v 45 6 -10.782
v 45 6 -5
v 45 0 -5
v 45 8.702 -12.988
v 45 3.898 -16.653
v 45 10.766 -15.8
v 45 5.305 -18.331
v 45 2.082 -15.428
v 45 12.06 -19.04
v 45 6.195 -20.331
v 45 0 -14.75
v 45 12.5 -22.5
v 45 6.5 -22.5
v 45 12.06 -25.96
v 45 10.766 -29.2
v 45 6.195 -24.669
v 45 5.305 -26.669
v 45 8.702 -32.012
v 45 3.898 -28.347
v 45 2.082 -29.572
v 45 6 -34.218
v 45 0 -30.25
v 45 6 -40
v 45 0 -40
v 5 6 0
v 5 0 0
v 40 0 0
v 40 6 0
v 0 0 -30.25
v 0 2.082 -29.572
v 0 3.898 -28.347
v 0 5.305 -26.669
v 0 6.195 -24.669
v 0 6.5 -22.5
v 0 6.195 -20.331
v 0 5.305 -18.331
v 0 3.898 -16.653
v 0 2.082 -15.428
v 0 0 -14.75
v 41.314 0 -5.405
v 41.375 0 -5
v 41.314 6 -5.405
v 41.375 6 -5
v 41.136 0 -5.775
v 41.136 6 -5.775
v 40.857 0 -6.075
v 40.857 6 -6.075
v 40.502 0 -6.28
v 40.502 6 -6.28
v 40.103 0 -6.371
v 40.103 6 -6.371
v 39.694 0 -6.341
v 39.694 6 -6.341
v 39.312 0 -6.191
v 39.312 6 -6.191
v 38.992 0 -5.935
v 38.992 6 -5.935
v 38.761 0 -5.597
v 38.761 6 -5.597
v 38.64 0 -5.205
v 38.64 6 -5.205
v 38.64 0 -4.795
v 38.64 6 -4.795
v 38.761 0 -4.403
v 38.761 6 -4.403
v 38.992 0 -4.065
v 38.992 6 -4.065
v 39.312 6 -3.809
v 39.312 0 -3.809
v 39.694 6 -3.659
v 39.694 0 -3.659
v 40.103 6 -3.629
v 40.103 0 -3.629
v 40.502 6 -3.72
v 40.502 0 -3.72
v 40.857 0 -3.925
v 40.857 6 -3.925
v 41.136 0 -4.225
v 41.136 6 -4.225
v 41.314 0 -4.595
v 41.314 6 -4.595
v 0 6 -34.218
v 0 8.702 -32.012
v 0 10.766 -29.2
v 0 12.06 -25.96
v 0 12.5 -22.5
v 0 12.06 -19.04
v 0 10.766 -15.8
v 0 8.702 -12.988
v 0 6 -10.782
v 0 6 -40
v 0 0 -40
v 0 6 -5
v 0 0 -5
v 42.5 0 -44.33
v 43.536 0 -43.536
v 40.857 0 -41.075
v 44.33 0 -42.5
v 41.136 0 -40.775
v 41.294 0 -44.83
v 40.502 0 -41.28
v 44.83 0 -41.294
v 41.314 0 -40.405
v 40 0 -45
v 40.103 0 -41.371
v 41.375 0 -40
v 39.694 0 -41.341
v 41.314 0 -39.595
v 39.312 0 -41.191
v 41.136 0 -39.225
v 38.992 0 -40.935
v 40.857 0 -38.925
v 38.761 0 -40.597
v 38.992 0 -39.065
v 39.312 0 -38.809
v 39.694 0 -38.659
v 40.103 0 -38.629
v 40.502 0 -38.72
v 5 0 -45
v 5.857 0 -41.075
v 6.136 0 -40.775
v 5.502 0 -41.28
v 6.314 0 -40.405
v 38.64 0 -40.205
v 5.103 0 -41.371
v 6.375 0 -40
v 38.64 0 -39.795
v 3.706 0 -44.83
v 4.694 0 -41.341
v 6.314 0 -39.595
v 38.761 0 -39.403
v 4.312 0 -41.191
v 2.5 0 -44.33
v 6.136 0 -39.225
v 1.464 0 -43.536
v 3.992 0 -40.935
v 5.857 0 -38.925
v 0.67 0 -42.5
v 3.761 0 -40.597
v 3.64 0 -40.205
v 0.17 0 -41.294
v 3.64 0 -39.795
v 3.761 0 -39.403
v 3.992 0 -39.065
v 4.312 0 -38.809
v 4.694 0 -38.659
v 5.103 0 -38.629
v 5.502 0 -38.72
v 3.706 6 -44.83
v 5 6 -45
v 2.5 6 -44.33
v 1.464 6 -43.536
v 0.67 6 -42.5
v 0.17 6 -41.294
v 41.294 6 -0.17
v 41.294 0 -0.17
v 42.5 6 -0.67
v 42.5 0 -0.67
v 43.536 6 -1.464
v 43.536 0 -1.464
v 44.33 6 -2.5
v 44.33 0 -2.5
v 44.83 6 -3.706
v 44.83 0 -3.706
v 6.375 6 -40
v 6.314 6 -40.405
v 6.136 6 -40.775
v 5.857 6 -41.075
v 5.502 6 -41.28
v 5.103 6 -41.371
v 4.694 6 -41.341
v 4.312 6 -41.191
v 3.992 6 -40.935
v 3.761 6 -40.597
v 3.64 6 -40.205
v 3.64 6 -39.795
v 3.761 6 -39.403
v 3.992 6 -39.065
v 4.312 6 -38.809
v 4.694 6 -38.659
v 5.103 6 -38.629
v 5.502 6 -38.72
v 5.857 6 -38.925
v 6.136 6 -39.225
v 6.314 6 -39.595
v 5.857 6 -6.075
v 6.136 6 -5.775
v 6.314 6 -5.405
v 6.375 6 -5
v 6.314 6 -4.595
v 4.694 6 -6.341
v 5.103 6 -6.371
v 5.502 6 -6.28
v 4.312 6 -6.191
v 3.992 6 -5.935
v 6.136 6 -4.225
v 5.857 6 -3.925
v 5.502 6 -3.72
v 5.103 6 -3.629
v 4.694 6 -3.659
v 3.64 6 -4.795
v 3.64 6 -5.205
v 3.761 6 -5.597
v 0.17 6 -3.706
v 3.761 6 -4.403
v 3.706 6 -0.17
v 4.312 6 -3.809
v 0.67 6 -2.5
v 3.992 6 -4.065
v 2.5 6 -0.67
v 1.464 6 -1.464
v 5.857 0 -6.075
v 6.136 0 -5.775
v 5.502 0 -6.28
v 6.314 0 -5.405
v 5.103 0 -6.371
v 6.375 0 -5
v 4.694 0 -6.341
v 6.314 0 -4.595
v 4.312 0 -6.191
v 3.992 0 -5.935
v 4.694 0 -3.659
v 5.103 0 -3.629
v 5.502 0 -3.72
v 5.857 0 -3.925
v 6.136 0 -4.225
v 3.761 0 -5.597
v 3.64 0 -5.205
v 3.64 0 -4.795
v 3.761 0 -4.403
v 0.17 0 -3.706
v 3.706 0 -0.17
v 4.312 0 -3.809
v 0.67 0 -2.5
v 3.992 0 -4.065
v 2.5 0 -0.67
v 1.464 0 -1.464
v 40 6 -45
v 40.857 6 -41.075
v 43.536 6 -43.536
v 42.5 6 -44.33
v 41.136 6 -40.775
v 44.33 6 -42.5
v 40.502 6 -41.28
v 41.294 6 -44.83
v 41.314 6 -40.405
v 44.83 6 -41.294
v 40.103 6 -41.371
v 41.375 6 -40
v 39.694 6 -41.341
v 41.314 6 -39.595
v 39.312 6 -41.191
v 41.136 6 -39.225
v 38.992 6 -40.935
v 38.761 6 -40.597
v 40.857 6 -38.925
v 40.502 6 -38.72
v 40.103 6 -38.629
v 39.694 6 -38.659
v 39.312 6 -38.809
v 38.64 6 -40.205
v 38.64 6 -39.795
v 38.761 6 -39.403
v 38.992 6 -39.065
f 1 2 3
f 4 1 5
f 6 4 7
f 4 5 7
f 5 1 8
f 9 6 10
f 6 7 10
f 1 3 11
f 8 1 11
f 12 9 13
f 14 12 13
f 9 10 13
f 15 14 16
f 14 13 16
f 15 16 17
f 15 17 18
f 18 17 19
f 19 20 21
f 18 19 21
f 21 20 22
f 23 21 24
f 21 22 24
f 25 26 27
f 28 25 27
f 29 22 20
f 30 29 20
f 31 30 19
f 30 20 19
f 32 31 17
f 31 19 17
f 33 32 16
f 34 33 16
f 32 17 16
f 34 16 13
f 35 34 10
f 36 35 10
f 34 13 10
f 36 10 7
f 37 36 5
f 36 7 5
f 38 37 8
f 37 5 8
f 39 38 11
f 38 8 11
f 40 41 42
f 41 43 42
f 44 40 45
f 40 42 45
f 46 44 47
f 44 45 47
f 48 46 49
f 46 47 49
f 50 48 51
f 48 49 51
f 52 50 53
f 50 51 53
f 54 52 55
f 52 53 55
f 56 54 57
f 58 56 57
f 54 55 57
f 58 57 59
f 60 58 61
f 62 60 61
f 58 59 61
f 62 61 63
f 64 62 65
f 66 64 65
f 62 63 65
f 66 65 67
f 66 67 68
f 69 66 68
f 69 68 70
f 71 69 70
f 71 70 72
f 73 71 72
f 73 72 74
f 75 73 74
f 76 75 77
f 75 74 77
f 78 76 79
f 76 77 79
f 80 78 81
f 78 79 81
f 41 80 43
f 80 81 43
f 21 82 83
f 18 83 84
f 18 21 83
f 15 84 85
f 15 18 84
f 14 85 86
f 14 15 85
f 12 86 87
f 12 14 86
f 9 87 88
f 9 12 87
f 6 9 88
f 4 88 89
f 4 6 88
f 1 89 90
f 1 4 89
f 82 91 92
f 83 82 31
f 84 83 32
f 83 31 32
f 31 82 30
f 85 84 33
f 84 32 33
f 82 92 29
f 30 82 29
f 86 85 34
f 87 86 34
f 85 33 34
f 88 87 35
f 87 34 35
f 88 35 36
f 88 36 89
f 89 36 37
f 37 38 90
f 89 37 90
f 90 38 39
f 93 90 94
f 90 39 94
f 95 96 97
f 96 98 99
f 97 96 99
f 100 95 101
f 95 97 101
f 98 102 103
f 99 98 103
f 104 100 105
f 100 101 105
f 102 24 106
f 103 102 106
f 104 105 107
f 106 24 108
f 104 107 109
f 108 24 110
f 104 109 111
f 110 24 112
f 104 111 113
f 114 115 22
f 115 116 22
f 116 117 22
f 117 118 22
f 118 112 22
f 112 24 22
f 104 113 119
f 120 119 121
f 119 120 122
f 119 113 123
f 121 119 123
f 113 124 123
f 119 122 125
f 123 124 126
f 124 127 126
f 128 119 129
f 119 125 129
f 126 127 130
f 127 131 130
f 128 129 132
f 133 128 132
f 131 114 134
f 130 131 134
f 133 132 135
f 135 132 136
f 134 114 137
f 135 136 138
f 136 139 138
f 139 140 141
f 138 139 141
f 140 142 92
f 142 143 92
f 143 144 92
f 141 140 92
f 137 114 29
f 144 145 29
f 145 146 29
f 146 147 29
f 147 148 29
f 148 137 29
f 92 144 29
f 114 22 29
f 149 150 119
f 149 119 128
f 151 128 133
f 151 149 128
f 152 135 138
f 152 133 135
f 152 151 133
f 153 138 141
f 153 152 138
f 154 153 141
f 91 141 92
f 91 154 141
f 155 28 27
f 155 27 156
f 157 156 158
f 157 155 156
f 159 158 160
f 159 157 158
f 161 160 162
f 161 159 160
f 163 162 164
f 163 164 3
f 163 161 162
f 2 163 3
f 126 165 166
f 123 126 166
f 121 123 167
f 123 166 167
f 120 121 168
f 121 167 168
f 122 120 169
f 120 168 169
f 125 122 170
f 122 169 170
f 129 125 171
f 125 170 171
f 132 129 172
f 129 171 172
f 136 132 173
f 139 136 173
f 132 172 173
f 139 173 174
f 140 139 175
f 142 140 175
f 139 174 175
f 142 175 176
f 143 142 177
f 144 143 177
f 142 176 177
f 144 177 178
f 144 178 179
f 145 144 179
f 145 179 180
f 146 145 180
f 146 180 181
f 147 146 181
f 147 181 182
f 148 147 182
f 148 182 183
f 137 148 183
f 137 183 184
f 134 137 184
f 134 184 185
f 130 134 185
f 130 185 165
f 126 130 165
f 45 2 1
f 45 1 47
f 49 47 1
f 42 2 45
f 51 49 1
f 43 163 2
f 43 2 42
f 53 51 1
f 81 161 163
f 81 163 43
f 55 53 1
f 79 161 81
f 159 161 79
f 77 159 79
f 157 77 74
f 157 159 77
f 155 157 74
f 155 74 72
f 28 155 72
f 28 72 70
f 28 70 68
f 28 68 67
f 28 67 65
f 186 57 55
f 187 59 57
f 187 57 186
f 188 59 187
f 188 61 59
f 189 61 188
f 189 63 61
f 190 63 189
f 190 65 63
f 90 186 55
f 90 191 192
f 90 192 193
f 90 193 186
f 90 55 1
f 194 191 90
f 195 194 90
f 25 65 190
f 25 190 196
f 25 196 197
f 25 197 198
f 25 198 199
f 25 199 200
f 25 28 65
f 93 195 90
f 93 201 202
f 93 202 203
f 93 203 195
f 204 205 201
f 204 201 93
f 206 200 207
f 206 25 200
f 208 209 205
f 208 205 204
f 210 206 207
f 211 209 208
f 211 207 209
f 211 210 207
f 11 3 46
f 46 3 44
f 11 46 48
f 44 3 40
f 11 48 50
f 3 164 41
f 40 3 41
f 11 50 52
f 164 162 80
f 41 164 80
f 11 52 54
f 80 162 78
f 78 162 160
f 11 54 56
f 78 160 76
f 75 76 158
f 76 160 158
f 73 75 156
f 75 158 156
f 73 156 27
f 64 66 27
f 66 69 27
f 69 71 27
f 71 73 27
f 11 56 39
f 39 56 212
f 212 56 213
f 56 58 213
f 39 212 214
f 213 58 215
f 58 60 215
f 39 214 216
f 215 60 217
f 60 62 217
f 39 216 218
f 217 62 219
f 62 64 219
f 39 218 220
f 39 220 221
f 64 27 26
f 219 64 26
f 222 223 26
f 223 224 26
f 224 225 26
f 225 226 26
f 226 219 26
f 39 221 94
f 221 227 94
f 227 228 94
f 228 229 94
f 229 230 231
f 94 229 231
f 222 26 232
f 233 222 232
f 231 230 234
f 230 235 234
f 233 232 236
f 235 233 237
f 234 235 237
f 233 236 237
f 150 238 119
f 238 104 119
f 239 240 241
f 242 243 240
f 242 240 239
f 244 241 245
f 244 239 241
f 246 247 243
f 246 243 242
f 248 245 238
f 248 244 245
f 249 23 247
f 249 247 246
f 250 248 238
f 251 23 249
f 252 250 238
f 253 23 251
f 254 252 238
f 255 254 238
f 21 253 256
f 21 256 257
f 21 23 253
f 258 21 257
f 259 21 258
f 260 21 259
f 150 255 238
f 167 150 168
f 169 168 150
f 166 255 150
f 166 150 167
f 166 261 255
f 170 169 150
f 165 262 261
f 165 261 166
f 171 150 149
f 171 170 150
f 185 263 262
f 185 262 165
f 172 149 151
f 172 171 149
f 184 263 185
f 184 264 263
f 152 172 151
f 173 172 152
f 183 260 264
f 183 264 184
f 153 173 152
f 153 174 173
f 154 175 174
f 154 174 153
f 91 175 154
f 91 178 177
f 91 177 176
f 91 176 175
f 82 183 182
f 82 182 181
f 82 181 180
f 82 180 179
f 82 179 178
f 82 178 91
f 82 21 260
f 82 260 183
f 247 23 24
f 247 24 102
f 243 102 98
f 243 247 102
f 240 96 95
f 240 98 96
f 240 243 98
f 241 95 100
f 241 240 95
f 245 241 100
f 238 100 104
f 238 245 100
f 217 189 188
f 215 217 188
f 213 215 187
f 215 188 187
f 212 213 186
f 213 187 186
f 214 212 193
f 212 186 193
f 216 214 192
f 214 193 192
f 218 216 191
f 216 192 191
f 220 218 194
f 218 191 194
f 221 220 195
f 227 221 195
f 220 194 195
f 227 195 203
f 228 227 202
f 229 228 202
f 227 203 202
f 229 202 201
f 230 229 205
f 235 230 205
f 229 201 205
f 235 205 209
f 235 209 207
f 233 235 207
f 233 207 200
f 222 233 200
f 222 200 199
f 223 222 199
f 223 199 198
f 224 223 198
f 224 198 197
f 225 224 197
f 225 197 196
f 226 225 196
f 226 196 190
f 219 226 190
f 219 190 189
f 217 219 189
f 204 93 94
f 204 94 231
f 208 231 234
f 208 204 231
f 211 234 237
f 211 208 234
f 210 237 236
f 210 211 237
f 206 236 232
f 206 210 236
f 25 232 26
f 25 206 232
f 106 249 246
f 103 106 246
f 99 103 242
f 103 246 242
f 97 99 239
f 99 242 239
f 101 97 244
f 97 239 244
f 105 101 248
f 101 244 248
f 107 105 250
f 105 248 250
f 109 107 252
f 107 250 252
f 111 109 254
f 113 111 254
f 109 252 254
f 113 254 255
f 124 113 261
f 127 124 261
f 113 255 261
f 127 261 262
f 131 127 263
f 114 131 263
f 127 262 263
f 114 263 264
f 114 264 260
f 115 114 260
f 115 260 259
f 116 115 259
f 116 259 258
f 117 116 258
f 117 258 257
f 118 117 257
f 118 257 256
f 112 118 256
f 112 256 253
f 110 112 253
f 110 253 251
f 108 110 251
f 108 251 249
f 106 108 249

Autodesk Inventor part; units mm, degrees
ref_plane "YZ Plane" through (0, 0, 0) normal (1, 0, 0) x (0, 1, 0)
ref_plane "XZ Plane" through (0, 0, 0) normal (0, 1, 0) x (-1, 0, 0)
ref_plane "XY Plane" through (0, 0, 0) normal (0, 0, 1) x (1, 0, 0)
sketch "Sketch1" plane through (0, 0, 0) normal (0, 1, 0) x (-1, 0, 0)
  line L0 (0, 0) -> (-45, 0)
  line L1 (-45, 0) -> (-45, -45)
  line L2 (-45, -45) -> (0, -45)
  line L3 (0, -45) -> (0, 0)
  dimension "d0" = 45
  dimension "d1" = 45
extrude "Extrusion1" add sketch "Sketch1" along normal blind 6
sketch "Sketch2" plane through (45, 0, 0) normal (1, 0, 0) x (0, 0, -1)
  line L0 (0, 0) -> (45, 0) projected
  line L1 (45, 0) -> (45, 6) projected
  line L2 (0, 6) -> (45, 6) projected
  line L3 (0, 0) -> (0, 6) projected
  line L4 (22.5, 0) -> (30.25, 0)
  line L5 (0, 0) -> (45, 0) projected
  line L6 (30.25, 0) -> (14.75, 0)
  line L7 (22.5, 0) -> (22.5, 6.5)
  arc A0 (30.25, 0) -> (14.75, 0) centre (22.5, -1.3702) ccw
  line L8 (14.75, 0) -> (8.75, 0)
  line L9 (30.25, 0) -> (36.25, 0)
  line L10 (22.5, 6.5) -> (22.5, 12.5)
  arc A1 (36.25, 0) -> (8.75, 0) centre (22.5, -1.3125) ccw
  arc A2 (30.25, 0) -> (14.75, 0) centre (22.5, -1.3702) ccw
  line L11 (14.75, 0) -> (30.25, 0)
  point P0 (22.5, 3)
  dimension "d4" = 7.75
  dimension "d5" = 15.5
  dimension "d6" = 6.5
  dimension "d7" = 6
  dimension "d8" = 6
  dimension "d9" = 6
extrude "Extrusion2" add sketch "Sketch2" against normal blind 45 contours A1 L2 A0 L0 | A1 L10 A0 L2 | A1 L2 A0 L10 | A0 L2 A1 L0
sketch "Sketch3" plane through (45, 0, 0) normal (1, 0, 0) x (0, 0, -1)
  line L0 (0, 0) -> (45, 0)
  line L1 (0, 6) -> (45, 6)
  line L2 (22.5, 0) -> (30.25, 0)
  line L3 (0, 0) -> (45, 0)
  line L4 (30.25, 0) -> (14.75, 0)
  line L5 (22.5, 0) -> (22.5, 6.5)
  arc A0 (30.25, 0) -> (14.75, 0) centre (22.5, -1.3702) ccw
  line L6 (14.75, 0) -> (8.75, 0)
  line L7 (30.25, 0) -> (36.25, 0)
  line L8 (22.5, 6.5) -> (22.5, 12.5)
  arc A1 (30.25, 0) -> (14.75, 0) centre (22.5, -1.3702) ccw
  line L9 (14.75, 0) -> (30.25, 0)
  point P0 (22.5, 3)
  point P1 (22.5, -1.3125)
  dimension "d12" = 7.75
  dimension "d13" = 15.5
  dimension "d14" = 6.5
  dimension "d15" = 6
  dimension "d16" = 6
  dimension "d17" = 6
extrude "Extrusion3" cut sketch "Sketch3" against normal blind 45
fillet "Fillet1" radius 5 4 edges at (45, 3, 0) (45, 3, -45) (0, 3, 0) (0, 3, -45)
sketch "Sketch4" plane through (0, 6, 0) normal (0, 1, 0) x (1, 0, 0)
  arc A0 (0, 5) -> (5, 0) centre (5, 5) ccw projected
  line L0 (5, 0) -> (40, 0) projected
  arc A1 (40, 0) -> (45, 5) centre (40, 5) ccw projected
  line L1 (45, 5) -> (45, 10.782) projected
  line L2 (45, 10.782) -> (0, 10.782) projected
  line L3 (0, 10.782) -> (0, 5) projected
  line L4 (45, 10.782) -> (0, 10.782) projected
  line L5 (45, 34.218) -> (45, 10.782) projected
  line L6 (0, 34.218) -> (45, 34.218) projected
  line L7 (0, 10.782) -> (0, 34.218) projected
  arc A2 (5, 45) -> (0, 40) centre (5, 40) ccw projected
  line L8 (0, 40) -> (0, 34.218) projected
  line L9 (0, 34.218) -> (45, 34.218) projected
  line L10 (45, 34.218) -> (45, 40) projected
  arc A3 (45, 40) -> (40, 45) centre (40, 40) ccw projected
  line L11 (40, 45) -> (5, 45) projected
  line L12 (5, 5) -> (5, 40)
  line L13 (5, 40) -> (40, 40)
  line L14 (40, 40) -> (40, 5)
  line L15 (40, 5) -> (5, 5)
  circle A4 centre (5, 5) radius 1.375
  circle A5 centre (40, 5) radius 1.375
  circle A6 centre (5, 40) radius 1.375
  circle A7 centre (40, 40) radius 1.375
  point P0 (0, 0)
  dimension "d21" = 2.75
  dimension "d22" = 2.75
  dimension "d23" = 2.75
  dimension "d24" = 2.75
extrude "Extrusion4" cut sketch "Sketch4" against normal blind 45 contours A4 L15 L12 | L12 L15 A4 | A5 L15 L14 | L14 L15 A5 | A6 L13 L12 | L12 L13 A6 | A7 L13 L14 | L14 L13 A7
sketch "Sketch5" plane through (0, 0, 0) normal (0, -1, 0) x (1, 0, 0)
  line L0 (45, -5) -> (45, -14.75) projected
  line L1 (45, -14.75) -> (45, -30.25) projected
  line L2 (45, -30.25) -> (45, -40) projected
  arc A0 (40, -45) -> (45, -40) centre (40, -40) ccw projected
  circle A1 centre (40, -40) radius 1.375 projected
  circle A2 centre (40, -5) radius 1.375 projected
  arc A3 (45, -5) -> (40, 0) centre (40, -5) ccw projected
  line L3 (5, 0) -> (40, 0) projected
  circle A4 centre (5, -5) radius 1.375 projected
  arc A5 (5, 0) -> (0, -5) centre (5, -5) ccw projected
  line L4 (0, -14.75) -> (0, -5) projected
  line L5 (0, -30.25) -> (0, -14.75) projected
  line L6 (0, -40) -> (0, -30.25) projected
  arc A6 (0, -40) -> (5, -45) centre (5, -40) ccw projected
  line L7 (40, -45) -> (5, -45) projected
  circle A7 centre (5, -40) radius 1.375 projected
  point P0 (0, 0)
properties part number "Roof" material "PC/ABS Plastic"
